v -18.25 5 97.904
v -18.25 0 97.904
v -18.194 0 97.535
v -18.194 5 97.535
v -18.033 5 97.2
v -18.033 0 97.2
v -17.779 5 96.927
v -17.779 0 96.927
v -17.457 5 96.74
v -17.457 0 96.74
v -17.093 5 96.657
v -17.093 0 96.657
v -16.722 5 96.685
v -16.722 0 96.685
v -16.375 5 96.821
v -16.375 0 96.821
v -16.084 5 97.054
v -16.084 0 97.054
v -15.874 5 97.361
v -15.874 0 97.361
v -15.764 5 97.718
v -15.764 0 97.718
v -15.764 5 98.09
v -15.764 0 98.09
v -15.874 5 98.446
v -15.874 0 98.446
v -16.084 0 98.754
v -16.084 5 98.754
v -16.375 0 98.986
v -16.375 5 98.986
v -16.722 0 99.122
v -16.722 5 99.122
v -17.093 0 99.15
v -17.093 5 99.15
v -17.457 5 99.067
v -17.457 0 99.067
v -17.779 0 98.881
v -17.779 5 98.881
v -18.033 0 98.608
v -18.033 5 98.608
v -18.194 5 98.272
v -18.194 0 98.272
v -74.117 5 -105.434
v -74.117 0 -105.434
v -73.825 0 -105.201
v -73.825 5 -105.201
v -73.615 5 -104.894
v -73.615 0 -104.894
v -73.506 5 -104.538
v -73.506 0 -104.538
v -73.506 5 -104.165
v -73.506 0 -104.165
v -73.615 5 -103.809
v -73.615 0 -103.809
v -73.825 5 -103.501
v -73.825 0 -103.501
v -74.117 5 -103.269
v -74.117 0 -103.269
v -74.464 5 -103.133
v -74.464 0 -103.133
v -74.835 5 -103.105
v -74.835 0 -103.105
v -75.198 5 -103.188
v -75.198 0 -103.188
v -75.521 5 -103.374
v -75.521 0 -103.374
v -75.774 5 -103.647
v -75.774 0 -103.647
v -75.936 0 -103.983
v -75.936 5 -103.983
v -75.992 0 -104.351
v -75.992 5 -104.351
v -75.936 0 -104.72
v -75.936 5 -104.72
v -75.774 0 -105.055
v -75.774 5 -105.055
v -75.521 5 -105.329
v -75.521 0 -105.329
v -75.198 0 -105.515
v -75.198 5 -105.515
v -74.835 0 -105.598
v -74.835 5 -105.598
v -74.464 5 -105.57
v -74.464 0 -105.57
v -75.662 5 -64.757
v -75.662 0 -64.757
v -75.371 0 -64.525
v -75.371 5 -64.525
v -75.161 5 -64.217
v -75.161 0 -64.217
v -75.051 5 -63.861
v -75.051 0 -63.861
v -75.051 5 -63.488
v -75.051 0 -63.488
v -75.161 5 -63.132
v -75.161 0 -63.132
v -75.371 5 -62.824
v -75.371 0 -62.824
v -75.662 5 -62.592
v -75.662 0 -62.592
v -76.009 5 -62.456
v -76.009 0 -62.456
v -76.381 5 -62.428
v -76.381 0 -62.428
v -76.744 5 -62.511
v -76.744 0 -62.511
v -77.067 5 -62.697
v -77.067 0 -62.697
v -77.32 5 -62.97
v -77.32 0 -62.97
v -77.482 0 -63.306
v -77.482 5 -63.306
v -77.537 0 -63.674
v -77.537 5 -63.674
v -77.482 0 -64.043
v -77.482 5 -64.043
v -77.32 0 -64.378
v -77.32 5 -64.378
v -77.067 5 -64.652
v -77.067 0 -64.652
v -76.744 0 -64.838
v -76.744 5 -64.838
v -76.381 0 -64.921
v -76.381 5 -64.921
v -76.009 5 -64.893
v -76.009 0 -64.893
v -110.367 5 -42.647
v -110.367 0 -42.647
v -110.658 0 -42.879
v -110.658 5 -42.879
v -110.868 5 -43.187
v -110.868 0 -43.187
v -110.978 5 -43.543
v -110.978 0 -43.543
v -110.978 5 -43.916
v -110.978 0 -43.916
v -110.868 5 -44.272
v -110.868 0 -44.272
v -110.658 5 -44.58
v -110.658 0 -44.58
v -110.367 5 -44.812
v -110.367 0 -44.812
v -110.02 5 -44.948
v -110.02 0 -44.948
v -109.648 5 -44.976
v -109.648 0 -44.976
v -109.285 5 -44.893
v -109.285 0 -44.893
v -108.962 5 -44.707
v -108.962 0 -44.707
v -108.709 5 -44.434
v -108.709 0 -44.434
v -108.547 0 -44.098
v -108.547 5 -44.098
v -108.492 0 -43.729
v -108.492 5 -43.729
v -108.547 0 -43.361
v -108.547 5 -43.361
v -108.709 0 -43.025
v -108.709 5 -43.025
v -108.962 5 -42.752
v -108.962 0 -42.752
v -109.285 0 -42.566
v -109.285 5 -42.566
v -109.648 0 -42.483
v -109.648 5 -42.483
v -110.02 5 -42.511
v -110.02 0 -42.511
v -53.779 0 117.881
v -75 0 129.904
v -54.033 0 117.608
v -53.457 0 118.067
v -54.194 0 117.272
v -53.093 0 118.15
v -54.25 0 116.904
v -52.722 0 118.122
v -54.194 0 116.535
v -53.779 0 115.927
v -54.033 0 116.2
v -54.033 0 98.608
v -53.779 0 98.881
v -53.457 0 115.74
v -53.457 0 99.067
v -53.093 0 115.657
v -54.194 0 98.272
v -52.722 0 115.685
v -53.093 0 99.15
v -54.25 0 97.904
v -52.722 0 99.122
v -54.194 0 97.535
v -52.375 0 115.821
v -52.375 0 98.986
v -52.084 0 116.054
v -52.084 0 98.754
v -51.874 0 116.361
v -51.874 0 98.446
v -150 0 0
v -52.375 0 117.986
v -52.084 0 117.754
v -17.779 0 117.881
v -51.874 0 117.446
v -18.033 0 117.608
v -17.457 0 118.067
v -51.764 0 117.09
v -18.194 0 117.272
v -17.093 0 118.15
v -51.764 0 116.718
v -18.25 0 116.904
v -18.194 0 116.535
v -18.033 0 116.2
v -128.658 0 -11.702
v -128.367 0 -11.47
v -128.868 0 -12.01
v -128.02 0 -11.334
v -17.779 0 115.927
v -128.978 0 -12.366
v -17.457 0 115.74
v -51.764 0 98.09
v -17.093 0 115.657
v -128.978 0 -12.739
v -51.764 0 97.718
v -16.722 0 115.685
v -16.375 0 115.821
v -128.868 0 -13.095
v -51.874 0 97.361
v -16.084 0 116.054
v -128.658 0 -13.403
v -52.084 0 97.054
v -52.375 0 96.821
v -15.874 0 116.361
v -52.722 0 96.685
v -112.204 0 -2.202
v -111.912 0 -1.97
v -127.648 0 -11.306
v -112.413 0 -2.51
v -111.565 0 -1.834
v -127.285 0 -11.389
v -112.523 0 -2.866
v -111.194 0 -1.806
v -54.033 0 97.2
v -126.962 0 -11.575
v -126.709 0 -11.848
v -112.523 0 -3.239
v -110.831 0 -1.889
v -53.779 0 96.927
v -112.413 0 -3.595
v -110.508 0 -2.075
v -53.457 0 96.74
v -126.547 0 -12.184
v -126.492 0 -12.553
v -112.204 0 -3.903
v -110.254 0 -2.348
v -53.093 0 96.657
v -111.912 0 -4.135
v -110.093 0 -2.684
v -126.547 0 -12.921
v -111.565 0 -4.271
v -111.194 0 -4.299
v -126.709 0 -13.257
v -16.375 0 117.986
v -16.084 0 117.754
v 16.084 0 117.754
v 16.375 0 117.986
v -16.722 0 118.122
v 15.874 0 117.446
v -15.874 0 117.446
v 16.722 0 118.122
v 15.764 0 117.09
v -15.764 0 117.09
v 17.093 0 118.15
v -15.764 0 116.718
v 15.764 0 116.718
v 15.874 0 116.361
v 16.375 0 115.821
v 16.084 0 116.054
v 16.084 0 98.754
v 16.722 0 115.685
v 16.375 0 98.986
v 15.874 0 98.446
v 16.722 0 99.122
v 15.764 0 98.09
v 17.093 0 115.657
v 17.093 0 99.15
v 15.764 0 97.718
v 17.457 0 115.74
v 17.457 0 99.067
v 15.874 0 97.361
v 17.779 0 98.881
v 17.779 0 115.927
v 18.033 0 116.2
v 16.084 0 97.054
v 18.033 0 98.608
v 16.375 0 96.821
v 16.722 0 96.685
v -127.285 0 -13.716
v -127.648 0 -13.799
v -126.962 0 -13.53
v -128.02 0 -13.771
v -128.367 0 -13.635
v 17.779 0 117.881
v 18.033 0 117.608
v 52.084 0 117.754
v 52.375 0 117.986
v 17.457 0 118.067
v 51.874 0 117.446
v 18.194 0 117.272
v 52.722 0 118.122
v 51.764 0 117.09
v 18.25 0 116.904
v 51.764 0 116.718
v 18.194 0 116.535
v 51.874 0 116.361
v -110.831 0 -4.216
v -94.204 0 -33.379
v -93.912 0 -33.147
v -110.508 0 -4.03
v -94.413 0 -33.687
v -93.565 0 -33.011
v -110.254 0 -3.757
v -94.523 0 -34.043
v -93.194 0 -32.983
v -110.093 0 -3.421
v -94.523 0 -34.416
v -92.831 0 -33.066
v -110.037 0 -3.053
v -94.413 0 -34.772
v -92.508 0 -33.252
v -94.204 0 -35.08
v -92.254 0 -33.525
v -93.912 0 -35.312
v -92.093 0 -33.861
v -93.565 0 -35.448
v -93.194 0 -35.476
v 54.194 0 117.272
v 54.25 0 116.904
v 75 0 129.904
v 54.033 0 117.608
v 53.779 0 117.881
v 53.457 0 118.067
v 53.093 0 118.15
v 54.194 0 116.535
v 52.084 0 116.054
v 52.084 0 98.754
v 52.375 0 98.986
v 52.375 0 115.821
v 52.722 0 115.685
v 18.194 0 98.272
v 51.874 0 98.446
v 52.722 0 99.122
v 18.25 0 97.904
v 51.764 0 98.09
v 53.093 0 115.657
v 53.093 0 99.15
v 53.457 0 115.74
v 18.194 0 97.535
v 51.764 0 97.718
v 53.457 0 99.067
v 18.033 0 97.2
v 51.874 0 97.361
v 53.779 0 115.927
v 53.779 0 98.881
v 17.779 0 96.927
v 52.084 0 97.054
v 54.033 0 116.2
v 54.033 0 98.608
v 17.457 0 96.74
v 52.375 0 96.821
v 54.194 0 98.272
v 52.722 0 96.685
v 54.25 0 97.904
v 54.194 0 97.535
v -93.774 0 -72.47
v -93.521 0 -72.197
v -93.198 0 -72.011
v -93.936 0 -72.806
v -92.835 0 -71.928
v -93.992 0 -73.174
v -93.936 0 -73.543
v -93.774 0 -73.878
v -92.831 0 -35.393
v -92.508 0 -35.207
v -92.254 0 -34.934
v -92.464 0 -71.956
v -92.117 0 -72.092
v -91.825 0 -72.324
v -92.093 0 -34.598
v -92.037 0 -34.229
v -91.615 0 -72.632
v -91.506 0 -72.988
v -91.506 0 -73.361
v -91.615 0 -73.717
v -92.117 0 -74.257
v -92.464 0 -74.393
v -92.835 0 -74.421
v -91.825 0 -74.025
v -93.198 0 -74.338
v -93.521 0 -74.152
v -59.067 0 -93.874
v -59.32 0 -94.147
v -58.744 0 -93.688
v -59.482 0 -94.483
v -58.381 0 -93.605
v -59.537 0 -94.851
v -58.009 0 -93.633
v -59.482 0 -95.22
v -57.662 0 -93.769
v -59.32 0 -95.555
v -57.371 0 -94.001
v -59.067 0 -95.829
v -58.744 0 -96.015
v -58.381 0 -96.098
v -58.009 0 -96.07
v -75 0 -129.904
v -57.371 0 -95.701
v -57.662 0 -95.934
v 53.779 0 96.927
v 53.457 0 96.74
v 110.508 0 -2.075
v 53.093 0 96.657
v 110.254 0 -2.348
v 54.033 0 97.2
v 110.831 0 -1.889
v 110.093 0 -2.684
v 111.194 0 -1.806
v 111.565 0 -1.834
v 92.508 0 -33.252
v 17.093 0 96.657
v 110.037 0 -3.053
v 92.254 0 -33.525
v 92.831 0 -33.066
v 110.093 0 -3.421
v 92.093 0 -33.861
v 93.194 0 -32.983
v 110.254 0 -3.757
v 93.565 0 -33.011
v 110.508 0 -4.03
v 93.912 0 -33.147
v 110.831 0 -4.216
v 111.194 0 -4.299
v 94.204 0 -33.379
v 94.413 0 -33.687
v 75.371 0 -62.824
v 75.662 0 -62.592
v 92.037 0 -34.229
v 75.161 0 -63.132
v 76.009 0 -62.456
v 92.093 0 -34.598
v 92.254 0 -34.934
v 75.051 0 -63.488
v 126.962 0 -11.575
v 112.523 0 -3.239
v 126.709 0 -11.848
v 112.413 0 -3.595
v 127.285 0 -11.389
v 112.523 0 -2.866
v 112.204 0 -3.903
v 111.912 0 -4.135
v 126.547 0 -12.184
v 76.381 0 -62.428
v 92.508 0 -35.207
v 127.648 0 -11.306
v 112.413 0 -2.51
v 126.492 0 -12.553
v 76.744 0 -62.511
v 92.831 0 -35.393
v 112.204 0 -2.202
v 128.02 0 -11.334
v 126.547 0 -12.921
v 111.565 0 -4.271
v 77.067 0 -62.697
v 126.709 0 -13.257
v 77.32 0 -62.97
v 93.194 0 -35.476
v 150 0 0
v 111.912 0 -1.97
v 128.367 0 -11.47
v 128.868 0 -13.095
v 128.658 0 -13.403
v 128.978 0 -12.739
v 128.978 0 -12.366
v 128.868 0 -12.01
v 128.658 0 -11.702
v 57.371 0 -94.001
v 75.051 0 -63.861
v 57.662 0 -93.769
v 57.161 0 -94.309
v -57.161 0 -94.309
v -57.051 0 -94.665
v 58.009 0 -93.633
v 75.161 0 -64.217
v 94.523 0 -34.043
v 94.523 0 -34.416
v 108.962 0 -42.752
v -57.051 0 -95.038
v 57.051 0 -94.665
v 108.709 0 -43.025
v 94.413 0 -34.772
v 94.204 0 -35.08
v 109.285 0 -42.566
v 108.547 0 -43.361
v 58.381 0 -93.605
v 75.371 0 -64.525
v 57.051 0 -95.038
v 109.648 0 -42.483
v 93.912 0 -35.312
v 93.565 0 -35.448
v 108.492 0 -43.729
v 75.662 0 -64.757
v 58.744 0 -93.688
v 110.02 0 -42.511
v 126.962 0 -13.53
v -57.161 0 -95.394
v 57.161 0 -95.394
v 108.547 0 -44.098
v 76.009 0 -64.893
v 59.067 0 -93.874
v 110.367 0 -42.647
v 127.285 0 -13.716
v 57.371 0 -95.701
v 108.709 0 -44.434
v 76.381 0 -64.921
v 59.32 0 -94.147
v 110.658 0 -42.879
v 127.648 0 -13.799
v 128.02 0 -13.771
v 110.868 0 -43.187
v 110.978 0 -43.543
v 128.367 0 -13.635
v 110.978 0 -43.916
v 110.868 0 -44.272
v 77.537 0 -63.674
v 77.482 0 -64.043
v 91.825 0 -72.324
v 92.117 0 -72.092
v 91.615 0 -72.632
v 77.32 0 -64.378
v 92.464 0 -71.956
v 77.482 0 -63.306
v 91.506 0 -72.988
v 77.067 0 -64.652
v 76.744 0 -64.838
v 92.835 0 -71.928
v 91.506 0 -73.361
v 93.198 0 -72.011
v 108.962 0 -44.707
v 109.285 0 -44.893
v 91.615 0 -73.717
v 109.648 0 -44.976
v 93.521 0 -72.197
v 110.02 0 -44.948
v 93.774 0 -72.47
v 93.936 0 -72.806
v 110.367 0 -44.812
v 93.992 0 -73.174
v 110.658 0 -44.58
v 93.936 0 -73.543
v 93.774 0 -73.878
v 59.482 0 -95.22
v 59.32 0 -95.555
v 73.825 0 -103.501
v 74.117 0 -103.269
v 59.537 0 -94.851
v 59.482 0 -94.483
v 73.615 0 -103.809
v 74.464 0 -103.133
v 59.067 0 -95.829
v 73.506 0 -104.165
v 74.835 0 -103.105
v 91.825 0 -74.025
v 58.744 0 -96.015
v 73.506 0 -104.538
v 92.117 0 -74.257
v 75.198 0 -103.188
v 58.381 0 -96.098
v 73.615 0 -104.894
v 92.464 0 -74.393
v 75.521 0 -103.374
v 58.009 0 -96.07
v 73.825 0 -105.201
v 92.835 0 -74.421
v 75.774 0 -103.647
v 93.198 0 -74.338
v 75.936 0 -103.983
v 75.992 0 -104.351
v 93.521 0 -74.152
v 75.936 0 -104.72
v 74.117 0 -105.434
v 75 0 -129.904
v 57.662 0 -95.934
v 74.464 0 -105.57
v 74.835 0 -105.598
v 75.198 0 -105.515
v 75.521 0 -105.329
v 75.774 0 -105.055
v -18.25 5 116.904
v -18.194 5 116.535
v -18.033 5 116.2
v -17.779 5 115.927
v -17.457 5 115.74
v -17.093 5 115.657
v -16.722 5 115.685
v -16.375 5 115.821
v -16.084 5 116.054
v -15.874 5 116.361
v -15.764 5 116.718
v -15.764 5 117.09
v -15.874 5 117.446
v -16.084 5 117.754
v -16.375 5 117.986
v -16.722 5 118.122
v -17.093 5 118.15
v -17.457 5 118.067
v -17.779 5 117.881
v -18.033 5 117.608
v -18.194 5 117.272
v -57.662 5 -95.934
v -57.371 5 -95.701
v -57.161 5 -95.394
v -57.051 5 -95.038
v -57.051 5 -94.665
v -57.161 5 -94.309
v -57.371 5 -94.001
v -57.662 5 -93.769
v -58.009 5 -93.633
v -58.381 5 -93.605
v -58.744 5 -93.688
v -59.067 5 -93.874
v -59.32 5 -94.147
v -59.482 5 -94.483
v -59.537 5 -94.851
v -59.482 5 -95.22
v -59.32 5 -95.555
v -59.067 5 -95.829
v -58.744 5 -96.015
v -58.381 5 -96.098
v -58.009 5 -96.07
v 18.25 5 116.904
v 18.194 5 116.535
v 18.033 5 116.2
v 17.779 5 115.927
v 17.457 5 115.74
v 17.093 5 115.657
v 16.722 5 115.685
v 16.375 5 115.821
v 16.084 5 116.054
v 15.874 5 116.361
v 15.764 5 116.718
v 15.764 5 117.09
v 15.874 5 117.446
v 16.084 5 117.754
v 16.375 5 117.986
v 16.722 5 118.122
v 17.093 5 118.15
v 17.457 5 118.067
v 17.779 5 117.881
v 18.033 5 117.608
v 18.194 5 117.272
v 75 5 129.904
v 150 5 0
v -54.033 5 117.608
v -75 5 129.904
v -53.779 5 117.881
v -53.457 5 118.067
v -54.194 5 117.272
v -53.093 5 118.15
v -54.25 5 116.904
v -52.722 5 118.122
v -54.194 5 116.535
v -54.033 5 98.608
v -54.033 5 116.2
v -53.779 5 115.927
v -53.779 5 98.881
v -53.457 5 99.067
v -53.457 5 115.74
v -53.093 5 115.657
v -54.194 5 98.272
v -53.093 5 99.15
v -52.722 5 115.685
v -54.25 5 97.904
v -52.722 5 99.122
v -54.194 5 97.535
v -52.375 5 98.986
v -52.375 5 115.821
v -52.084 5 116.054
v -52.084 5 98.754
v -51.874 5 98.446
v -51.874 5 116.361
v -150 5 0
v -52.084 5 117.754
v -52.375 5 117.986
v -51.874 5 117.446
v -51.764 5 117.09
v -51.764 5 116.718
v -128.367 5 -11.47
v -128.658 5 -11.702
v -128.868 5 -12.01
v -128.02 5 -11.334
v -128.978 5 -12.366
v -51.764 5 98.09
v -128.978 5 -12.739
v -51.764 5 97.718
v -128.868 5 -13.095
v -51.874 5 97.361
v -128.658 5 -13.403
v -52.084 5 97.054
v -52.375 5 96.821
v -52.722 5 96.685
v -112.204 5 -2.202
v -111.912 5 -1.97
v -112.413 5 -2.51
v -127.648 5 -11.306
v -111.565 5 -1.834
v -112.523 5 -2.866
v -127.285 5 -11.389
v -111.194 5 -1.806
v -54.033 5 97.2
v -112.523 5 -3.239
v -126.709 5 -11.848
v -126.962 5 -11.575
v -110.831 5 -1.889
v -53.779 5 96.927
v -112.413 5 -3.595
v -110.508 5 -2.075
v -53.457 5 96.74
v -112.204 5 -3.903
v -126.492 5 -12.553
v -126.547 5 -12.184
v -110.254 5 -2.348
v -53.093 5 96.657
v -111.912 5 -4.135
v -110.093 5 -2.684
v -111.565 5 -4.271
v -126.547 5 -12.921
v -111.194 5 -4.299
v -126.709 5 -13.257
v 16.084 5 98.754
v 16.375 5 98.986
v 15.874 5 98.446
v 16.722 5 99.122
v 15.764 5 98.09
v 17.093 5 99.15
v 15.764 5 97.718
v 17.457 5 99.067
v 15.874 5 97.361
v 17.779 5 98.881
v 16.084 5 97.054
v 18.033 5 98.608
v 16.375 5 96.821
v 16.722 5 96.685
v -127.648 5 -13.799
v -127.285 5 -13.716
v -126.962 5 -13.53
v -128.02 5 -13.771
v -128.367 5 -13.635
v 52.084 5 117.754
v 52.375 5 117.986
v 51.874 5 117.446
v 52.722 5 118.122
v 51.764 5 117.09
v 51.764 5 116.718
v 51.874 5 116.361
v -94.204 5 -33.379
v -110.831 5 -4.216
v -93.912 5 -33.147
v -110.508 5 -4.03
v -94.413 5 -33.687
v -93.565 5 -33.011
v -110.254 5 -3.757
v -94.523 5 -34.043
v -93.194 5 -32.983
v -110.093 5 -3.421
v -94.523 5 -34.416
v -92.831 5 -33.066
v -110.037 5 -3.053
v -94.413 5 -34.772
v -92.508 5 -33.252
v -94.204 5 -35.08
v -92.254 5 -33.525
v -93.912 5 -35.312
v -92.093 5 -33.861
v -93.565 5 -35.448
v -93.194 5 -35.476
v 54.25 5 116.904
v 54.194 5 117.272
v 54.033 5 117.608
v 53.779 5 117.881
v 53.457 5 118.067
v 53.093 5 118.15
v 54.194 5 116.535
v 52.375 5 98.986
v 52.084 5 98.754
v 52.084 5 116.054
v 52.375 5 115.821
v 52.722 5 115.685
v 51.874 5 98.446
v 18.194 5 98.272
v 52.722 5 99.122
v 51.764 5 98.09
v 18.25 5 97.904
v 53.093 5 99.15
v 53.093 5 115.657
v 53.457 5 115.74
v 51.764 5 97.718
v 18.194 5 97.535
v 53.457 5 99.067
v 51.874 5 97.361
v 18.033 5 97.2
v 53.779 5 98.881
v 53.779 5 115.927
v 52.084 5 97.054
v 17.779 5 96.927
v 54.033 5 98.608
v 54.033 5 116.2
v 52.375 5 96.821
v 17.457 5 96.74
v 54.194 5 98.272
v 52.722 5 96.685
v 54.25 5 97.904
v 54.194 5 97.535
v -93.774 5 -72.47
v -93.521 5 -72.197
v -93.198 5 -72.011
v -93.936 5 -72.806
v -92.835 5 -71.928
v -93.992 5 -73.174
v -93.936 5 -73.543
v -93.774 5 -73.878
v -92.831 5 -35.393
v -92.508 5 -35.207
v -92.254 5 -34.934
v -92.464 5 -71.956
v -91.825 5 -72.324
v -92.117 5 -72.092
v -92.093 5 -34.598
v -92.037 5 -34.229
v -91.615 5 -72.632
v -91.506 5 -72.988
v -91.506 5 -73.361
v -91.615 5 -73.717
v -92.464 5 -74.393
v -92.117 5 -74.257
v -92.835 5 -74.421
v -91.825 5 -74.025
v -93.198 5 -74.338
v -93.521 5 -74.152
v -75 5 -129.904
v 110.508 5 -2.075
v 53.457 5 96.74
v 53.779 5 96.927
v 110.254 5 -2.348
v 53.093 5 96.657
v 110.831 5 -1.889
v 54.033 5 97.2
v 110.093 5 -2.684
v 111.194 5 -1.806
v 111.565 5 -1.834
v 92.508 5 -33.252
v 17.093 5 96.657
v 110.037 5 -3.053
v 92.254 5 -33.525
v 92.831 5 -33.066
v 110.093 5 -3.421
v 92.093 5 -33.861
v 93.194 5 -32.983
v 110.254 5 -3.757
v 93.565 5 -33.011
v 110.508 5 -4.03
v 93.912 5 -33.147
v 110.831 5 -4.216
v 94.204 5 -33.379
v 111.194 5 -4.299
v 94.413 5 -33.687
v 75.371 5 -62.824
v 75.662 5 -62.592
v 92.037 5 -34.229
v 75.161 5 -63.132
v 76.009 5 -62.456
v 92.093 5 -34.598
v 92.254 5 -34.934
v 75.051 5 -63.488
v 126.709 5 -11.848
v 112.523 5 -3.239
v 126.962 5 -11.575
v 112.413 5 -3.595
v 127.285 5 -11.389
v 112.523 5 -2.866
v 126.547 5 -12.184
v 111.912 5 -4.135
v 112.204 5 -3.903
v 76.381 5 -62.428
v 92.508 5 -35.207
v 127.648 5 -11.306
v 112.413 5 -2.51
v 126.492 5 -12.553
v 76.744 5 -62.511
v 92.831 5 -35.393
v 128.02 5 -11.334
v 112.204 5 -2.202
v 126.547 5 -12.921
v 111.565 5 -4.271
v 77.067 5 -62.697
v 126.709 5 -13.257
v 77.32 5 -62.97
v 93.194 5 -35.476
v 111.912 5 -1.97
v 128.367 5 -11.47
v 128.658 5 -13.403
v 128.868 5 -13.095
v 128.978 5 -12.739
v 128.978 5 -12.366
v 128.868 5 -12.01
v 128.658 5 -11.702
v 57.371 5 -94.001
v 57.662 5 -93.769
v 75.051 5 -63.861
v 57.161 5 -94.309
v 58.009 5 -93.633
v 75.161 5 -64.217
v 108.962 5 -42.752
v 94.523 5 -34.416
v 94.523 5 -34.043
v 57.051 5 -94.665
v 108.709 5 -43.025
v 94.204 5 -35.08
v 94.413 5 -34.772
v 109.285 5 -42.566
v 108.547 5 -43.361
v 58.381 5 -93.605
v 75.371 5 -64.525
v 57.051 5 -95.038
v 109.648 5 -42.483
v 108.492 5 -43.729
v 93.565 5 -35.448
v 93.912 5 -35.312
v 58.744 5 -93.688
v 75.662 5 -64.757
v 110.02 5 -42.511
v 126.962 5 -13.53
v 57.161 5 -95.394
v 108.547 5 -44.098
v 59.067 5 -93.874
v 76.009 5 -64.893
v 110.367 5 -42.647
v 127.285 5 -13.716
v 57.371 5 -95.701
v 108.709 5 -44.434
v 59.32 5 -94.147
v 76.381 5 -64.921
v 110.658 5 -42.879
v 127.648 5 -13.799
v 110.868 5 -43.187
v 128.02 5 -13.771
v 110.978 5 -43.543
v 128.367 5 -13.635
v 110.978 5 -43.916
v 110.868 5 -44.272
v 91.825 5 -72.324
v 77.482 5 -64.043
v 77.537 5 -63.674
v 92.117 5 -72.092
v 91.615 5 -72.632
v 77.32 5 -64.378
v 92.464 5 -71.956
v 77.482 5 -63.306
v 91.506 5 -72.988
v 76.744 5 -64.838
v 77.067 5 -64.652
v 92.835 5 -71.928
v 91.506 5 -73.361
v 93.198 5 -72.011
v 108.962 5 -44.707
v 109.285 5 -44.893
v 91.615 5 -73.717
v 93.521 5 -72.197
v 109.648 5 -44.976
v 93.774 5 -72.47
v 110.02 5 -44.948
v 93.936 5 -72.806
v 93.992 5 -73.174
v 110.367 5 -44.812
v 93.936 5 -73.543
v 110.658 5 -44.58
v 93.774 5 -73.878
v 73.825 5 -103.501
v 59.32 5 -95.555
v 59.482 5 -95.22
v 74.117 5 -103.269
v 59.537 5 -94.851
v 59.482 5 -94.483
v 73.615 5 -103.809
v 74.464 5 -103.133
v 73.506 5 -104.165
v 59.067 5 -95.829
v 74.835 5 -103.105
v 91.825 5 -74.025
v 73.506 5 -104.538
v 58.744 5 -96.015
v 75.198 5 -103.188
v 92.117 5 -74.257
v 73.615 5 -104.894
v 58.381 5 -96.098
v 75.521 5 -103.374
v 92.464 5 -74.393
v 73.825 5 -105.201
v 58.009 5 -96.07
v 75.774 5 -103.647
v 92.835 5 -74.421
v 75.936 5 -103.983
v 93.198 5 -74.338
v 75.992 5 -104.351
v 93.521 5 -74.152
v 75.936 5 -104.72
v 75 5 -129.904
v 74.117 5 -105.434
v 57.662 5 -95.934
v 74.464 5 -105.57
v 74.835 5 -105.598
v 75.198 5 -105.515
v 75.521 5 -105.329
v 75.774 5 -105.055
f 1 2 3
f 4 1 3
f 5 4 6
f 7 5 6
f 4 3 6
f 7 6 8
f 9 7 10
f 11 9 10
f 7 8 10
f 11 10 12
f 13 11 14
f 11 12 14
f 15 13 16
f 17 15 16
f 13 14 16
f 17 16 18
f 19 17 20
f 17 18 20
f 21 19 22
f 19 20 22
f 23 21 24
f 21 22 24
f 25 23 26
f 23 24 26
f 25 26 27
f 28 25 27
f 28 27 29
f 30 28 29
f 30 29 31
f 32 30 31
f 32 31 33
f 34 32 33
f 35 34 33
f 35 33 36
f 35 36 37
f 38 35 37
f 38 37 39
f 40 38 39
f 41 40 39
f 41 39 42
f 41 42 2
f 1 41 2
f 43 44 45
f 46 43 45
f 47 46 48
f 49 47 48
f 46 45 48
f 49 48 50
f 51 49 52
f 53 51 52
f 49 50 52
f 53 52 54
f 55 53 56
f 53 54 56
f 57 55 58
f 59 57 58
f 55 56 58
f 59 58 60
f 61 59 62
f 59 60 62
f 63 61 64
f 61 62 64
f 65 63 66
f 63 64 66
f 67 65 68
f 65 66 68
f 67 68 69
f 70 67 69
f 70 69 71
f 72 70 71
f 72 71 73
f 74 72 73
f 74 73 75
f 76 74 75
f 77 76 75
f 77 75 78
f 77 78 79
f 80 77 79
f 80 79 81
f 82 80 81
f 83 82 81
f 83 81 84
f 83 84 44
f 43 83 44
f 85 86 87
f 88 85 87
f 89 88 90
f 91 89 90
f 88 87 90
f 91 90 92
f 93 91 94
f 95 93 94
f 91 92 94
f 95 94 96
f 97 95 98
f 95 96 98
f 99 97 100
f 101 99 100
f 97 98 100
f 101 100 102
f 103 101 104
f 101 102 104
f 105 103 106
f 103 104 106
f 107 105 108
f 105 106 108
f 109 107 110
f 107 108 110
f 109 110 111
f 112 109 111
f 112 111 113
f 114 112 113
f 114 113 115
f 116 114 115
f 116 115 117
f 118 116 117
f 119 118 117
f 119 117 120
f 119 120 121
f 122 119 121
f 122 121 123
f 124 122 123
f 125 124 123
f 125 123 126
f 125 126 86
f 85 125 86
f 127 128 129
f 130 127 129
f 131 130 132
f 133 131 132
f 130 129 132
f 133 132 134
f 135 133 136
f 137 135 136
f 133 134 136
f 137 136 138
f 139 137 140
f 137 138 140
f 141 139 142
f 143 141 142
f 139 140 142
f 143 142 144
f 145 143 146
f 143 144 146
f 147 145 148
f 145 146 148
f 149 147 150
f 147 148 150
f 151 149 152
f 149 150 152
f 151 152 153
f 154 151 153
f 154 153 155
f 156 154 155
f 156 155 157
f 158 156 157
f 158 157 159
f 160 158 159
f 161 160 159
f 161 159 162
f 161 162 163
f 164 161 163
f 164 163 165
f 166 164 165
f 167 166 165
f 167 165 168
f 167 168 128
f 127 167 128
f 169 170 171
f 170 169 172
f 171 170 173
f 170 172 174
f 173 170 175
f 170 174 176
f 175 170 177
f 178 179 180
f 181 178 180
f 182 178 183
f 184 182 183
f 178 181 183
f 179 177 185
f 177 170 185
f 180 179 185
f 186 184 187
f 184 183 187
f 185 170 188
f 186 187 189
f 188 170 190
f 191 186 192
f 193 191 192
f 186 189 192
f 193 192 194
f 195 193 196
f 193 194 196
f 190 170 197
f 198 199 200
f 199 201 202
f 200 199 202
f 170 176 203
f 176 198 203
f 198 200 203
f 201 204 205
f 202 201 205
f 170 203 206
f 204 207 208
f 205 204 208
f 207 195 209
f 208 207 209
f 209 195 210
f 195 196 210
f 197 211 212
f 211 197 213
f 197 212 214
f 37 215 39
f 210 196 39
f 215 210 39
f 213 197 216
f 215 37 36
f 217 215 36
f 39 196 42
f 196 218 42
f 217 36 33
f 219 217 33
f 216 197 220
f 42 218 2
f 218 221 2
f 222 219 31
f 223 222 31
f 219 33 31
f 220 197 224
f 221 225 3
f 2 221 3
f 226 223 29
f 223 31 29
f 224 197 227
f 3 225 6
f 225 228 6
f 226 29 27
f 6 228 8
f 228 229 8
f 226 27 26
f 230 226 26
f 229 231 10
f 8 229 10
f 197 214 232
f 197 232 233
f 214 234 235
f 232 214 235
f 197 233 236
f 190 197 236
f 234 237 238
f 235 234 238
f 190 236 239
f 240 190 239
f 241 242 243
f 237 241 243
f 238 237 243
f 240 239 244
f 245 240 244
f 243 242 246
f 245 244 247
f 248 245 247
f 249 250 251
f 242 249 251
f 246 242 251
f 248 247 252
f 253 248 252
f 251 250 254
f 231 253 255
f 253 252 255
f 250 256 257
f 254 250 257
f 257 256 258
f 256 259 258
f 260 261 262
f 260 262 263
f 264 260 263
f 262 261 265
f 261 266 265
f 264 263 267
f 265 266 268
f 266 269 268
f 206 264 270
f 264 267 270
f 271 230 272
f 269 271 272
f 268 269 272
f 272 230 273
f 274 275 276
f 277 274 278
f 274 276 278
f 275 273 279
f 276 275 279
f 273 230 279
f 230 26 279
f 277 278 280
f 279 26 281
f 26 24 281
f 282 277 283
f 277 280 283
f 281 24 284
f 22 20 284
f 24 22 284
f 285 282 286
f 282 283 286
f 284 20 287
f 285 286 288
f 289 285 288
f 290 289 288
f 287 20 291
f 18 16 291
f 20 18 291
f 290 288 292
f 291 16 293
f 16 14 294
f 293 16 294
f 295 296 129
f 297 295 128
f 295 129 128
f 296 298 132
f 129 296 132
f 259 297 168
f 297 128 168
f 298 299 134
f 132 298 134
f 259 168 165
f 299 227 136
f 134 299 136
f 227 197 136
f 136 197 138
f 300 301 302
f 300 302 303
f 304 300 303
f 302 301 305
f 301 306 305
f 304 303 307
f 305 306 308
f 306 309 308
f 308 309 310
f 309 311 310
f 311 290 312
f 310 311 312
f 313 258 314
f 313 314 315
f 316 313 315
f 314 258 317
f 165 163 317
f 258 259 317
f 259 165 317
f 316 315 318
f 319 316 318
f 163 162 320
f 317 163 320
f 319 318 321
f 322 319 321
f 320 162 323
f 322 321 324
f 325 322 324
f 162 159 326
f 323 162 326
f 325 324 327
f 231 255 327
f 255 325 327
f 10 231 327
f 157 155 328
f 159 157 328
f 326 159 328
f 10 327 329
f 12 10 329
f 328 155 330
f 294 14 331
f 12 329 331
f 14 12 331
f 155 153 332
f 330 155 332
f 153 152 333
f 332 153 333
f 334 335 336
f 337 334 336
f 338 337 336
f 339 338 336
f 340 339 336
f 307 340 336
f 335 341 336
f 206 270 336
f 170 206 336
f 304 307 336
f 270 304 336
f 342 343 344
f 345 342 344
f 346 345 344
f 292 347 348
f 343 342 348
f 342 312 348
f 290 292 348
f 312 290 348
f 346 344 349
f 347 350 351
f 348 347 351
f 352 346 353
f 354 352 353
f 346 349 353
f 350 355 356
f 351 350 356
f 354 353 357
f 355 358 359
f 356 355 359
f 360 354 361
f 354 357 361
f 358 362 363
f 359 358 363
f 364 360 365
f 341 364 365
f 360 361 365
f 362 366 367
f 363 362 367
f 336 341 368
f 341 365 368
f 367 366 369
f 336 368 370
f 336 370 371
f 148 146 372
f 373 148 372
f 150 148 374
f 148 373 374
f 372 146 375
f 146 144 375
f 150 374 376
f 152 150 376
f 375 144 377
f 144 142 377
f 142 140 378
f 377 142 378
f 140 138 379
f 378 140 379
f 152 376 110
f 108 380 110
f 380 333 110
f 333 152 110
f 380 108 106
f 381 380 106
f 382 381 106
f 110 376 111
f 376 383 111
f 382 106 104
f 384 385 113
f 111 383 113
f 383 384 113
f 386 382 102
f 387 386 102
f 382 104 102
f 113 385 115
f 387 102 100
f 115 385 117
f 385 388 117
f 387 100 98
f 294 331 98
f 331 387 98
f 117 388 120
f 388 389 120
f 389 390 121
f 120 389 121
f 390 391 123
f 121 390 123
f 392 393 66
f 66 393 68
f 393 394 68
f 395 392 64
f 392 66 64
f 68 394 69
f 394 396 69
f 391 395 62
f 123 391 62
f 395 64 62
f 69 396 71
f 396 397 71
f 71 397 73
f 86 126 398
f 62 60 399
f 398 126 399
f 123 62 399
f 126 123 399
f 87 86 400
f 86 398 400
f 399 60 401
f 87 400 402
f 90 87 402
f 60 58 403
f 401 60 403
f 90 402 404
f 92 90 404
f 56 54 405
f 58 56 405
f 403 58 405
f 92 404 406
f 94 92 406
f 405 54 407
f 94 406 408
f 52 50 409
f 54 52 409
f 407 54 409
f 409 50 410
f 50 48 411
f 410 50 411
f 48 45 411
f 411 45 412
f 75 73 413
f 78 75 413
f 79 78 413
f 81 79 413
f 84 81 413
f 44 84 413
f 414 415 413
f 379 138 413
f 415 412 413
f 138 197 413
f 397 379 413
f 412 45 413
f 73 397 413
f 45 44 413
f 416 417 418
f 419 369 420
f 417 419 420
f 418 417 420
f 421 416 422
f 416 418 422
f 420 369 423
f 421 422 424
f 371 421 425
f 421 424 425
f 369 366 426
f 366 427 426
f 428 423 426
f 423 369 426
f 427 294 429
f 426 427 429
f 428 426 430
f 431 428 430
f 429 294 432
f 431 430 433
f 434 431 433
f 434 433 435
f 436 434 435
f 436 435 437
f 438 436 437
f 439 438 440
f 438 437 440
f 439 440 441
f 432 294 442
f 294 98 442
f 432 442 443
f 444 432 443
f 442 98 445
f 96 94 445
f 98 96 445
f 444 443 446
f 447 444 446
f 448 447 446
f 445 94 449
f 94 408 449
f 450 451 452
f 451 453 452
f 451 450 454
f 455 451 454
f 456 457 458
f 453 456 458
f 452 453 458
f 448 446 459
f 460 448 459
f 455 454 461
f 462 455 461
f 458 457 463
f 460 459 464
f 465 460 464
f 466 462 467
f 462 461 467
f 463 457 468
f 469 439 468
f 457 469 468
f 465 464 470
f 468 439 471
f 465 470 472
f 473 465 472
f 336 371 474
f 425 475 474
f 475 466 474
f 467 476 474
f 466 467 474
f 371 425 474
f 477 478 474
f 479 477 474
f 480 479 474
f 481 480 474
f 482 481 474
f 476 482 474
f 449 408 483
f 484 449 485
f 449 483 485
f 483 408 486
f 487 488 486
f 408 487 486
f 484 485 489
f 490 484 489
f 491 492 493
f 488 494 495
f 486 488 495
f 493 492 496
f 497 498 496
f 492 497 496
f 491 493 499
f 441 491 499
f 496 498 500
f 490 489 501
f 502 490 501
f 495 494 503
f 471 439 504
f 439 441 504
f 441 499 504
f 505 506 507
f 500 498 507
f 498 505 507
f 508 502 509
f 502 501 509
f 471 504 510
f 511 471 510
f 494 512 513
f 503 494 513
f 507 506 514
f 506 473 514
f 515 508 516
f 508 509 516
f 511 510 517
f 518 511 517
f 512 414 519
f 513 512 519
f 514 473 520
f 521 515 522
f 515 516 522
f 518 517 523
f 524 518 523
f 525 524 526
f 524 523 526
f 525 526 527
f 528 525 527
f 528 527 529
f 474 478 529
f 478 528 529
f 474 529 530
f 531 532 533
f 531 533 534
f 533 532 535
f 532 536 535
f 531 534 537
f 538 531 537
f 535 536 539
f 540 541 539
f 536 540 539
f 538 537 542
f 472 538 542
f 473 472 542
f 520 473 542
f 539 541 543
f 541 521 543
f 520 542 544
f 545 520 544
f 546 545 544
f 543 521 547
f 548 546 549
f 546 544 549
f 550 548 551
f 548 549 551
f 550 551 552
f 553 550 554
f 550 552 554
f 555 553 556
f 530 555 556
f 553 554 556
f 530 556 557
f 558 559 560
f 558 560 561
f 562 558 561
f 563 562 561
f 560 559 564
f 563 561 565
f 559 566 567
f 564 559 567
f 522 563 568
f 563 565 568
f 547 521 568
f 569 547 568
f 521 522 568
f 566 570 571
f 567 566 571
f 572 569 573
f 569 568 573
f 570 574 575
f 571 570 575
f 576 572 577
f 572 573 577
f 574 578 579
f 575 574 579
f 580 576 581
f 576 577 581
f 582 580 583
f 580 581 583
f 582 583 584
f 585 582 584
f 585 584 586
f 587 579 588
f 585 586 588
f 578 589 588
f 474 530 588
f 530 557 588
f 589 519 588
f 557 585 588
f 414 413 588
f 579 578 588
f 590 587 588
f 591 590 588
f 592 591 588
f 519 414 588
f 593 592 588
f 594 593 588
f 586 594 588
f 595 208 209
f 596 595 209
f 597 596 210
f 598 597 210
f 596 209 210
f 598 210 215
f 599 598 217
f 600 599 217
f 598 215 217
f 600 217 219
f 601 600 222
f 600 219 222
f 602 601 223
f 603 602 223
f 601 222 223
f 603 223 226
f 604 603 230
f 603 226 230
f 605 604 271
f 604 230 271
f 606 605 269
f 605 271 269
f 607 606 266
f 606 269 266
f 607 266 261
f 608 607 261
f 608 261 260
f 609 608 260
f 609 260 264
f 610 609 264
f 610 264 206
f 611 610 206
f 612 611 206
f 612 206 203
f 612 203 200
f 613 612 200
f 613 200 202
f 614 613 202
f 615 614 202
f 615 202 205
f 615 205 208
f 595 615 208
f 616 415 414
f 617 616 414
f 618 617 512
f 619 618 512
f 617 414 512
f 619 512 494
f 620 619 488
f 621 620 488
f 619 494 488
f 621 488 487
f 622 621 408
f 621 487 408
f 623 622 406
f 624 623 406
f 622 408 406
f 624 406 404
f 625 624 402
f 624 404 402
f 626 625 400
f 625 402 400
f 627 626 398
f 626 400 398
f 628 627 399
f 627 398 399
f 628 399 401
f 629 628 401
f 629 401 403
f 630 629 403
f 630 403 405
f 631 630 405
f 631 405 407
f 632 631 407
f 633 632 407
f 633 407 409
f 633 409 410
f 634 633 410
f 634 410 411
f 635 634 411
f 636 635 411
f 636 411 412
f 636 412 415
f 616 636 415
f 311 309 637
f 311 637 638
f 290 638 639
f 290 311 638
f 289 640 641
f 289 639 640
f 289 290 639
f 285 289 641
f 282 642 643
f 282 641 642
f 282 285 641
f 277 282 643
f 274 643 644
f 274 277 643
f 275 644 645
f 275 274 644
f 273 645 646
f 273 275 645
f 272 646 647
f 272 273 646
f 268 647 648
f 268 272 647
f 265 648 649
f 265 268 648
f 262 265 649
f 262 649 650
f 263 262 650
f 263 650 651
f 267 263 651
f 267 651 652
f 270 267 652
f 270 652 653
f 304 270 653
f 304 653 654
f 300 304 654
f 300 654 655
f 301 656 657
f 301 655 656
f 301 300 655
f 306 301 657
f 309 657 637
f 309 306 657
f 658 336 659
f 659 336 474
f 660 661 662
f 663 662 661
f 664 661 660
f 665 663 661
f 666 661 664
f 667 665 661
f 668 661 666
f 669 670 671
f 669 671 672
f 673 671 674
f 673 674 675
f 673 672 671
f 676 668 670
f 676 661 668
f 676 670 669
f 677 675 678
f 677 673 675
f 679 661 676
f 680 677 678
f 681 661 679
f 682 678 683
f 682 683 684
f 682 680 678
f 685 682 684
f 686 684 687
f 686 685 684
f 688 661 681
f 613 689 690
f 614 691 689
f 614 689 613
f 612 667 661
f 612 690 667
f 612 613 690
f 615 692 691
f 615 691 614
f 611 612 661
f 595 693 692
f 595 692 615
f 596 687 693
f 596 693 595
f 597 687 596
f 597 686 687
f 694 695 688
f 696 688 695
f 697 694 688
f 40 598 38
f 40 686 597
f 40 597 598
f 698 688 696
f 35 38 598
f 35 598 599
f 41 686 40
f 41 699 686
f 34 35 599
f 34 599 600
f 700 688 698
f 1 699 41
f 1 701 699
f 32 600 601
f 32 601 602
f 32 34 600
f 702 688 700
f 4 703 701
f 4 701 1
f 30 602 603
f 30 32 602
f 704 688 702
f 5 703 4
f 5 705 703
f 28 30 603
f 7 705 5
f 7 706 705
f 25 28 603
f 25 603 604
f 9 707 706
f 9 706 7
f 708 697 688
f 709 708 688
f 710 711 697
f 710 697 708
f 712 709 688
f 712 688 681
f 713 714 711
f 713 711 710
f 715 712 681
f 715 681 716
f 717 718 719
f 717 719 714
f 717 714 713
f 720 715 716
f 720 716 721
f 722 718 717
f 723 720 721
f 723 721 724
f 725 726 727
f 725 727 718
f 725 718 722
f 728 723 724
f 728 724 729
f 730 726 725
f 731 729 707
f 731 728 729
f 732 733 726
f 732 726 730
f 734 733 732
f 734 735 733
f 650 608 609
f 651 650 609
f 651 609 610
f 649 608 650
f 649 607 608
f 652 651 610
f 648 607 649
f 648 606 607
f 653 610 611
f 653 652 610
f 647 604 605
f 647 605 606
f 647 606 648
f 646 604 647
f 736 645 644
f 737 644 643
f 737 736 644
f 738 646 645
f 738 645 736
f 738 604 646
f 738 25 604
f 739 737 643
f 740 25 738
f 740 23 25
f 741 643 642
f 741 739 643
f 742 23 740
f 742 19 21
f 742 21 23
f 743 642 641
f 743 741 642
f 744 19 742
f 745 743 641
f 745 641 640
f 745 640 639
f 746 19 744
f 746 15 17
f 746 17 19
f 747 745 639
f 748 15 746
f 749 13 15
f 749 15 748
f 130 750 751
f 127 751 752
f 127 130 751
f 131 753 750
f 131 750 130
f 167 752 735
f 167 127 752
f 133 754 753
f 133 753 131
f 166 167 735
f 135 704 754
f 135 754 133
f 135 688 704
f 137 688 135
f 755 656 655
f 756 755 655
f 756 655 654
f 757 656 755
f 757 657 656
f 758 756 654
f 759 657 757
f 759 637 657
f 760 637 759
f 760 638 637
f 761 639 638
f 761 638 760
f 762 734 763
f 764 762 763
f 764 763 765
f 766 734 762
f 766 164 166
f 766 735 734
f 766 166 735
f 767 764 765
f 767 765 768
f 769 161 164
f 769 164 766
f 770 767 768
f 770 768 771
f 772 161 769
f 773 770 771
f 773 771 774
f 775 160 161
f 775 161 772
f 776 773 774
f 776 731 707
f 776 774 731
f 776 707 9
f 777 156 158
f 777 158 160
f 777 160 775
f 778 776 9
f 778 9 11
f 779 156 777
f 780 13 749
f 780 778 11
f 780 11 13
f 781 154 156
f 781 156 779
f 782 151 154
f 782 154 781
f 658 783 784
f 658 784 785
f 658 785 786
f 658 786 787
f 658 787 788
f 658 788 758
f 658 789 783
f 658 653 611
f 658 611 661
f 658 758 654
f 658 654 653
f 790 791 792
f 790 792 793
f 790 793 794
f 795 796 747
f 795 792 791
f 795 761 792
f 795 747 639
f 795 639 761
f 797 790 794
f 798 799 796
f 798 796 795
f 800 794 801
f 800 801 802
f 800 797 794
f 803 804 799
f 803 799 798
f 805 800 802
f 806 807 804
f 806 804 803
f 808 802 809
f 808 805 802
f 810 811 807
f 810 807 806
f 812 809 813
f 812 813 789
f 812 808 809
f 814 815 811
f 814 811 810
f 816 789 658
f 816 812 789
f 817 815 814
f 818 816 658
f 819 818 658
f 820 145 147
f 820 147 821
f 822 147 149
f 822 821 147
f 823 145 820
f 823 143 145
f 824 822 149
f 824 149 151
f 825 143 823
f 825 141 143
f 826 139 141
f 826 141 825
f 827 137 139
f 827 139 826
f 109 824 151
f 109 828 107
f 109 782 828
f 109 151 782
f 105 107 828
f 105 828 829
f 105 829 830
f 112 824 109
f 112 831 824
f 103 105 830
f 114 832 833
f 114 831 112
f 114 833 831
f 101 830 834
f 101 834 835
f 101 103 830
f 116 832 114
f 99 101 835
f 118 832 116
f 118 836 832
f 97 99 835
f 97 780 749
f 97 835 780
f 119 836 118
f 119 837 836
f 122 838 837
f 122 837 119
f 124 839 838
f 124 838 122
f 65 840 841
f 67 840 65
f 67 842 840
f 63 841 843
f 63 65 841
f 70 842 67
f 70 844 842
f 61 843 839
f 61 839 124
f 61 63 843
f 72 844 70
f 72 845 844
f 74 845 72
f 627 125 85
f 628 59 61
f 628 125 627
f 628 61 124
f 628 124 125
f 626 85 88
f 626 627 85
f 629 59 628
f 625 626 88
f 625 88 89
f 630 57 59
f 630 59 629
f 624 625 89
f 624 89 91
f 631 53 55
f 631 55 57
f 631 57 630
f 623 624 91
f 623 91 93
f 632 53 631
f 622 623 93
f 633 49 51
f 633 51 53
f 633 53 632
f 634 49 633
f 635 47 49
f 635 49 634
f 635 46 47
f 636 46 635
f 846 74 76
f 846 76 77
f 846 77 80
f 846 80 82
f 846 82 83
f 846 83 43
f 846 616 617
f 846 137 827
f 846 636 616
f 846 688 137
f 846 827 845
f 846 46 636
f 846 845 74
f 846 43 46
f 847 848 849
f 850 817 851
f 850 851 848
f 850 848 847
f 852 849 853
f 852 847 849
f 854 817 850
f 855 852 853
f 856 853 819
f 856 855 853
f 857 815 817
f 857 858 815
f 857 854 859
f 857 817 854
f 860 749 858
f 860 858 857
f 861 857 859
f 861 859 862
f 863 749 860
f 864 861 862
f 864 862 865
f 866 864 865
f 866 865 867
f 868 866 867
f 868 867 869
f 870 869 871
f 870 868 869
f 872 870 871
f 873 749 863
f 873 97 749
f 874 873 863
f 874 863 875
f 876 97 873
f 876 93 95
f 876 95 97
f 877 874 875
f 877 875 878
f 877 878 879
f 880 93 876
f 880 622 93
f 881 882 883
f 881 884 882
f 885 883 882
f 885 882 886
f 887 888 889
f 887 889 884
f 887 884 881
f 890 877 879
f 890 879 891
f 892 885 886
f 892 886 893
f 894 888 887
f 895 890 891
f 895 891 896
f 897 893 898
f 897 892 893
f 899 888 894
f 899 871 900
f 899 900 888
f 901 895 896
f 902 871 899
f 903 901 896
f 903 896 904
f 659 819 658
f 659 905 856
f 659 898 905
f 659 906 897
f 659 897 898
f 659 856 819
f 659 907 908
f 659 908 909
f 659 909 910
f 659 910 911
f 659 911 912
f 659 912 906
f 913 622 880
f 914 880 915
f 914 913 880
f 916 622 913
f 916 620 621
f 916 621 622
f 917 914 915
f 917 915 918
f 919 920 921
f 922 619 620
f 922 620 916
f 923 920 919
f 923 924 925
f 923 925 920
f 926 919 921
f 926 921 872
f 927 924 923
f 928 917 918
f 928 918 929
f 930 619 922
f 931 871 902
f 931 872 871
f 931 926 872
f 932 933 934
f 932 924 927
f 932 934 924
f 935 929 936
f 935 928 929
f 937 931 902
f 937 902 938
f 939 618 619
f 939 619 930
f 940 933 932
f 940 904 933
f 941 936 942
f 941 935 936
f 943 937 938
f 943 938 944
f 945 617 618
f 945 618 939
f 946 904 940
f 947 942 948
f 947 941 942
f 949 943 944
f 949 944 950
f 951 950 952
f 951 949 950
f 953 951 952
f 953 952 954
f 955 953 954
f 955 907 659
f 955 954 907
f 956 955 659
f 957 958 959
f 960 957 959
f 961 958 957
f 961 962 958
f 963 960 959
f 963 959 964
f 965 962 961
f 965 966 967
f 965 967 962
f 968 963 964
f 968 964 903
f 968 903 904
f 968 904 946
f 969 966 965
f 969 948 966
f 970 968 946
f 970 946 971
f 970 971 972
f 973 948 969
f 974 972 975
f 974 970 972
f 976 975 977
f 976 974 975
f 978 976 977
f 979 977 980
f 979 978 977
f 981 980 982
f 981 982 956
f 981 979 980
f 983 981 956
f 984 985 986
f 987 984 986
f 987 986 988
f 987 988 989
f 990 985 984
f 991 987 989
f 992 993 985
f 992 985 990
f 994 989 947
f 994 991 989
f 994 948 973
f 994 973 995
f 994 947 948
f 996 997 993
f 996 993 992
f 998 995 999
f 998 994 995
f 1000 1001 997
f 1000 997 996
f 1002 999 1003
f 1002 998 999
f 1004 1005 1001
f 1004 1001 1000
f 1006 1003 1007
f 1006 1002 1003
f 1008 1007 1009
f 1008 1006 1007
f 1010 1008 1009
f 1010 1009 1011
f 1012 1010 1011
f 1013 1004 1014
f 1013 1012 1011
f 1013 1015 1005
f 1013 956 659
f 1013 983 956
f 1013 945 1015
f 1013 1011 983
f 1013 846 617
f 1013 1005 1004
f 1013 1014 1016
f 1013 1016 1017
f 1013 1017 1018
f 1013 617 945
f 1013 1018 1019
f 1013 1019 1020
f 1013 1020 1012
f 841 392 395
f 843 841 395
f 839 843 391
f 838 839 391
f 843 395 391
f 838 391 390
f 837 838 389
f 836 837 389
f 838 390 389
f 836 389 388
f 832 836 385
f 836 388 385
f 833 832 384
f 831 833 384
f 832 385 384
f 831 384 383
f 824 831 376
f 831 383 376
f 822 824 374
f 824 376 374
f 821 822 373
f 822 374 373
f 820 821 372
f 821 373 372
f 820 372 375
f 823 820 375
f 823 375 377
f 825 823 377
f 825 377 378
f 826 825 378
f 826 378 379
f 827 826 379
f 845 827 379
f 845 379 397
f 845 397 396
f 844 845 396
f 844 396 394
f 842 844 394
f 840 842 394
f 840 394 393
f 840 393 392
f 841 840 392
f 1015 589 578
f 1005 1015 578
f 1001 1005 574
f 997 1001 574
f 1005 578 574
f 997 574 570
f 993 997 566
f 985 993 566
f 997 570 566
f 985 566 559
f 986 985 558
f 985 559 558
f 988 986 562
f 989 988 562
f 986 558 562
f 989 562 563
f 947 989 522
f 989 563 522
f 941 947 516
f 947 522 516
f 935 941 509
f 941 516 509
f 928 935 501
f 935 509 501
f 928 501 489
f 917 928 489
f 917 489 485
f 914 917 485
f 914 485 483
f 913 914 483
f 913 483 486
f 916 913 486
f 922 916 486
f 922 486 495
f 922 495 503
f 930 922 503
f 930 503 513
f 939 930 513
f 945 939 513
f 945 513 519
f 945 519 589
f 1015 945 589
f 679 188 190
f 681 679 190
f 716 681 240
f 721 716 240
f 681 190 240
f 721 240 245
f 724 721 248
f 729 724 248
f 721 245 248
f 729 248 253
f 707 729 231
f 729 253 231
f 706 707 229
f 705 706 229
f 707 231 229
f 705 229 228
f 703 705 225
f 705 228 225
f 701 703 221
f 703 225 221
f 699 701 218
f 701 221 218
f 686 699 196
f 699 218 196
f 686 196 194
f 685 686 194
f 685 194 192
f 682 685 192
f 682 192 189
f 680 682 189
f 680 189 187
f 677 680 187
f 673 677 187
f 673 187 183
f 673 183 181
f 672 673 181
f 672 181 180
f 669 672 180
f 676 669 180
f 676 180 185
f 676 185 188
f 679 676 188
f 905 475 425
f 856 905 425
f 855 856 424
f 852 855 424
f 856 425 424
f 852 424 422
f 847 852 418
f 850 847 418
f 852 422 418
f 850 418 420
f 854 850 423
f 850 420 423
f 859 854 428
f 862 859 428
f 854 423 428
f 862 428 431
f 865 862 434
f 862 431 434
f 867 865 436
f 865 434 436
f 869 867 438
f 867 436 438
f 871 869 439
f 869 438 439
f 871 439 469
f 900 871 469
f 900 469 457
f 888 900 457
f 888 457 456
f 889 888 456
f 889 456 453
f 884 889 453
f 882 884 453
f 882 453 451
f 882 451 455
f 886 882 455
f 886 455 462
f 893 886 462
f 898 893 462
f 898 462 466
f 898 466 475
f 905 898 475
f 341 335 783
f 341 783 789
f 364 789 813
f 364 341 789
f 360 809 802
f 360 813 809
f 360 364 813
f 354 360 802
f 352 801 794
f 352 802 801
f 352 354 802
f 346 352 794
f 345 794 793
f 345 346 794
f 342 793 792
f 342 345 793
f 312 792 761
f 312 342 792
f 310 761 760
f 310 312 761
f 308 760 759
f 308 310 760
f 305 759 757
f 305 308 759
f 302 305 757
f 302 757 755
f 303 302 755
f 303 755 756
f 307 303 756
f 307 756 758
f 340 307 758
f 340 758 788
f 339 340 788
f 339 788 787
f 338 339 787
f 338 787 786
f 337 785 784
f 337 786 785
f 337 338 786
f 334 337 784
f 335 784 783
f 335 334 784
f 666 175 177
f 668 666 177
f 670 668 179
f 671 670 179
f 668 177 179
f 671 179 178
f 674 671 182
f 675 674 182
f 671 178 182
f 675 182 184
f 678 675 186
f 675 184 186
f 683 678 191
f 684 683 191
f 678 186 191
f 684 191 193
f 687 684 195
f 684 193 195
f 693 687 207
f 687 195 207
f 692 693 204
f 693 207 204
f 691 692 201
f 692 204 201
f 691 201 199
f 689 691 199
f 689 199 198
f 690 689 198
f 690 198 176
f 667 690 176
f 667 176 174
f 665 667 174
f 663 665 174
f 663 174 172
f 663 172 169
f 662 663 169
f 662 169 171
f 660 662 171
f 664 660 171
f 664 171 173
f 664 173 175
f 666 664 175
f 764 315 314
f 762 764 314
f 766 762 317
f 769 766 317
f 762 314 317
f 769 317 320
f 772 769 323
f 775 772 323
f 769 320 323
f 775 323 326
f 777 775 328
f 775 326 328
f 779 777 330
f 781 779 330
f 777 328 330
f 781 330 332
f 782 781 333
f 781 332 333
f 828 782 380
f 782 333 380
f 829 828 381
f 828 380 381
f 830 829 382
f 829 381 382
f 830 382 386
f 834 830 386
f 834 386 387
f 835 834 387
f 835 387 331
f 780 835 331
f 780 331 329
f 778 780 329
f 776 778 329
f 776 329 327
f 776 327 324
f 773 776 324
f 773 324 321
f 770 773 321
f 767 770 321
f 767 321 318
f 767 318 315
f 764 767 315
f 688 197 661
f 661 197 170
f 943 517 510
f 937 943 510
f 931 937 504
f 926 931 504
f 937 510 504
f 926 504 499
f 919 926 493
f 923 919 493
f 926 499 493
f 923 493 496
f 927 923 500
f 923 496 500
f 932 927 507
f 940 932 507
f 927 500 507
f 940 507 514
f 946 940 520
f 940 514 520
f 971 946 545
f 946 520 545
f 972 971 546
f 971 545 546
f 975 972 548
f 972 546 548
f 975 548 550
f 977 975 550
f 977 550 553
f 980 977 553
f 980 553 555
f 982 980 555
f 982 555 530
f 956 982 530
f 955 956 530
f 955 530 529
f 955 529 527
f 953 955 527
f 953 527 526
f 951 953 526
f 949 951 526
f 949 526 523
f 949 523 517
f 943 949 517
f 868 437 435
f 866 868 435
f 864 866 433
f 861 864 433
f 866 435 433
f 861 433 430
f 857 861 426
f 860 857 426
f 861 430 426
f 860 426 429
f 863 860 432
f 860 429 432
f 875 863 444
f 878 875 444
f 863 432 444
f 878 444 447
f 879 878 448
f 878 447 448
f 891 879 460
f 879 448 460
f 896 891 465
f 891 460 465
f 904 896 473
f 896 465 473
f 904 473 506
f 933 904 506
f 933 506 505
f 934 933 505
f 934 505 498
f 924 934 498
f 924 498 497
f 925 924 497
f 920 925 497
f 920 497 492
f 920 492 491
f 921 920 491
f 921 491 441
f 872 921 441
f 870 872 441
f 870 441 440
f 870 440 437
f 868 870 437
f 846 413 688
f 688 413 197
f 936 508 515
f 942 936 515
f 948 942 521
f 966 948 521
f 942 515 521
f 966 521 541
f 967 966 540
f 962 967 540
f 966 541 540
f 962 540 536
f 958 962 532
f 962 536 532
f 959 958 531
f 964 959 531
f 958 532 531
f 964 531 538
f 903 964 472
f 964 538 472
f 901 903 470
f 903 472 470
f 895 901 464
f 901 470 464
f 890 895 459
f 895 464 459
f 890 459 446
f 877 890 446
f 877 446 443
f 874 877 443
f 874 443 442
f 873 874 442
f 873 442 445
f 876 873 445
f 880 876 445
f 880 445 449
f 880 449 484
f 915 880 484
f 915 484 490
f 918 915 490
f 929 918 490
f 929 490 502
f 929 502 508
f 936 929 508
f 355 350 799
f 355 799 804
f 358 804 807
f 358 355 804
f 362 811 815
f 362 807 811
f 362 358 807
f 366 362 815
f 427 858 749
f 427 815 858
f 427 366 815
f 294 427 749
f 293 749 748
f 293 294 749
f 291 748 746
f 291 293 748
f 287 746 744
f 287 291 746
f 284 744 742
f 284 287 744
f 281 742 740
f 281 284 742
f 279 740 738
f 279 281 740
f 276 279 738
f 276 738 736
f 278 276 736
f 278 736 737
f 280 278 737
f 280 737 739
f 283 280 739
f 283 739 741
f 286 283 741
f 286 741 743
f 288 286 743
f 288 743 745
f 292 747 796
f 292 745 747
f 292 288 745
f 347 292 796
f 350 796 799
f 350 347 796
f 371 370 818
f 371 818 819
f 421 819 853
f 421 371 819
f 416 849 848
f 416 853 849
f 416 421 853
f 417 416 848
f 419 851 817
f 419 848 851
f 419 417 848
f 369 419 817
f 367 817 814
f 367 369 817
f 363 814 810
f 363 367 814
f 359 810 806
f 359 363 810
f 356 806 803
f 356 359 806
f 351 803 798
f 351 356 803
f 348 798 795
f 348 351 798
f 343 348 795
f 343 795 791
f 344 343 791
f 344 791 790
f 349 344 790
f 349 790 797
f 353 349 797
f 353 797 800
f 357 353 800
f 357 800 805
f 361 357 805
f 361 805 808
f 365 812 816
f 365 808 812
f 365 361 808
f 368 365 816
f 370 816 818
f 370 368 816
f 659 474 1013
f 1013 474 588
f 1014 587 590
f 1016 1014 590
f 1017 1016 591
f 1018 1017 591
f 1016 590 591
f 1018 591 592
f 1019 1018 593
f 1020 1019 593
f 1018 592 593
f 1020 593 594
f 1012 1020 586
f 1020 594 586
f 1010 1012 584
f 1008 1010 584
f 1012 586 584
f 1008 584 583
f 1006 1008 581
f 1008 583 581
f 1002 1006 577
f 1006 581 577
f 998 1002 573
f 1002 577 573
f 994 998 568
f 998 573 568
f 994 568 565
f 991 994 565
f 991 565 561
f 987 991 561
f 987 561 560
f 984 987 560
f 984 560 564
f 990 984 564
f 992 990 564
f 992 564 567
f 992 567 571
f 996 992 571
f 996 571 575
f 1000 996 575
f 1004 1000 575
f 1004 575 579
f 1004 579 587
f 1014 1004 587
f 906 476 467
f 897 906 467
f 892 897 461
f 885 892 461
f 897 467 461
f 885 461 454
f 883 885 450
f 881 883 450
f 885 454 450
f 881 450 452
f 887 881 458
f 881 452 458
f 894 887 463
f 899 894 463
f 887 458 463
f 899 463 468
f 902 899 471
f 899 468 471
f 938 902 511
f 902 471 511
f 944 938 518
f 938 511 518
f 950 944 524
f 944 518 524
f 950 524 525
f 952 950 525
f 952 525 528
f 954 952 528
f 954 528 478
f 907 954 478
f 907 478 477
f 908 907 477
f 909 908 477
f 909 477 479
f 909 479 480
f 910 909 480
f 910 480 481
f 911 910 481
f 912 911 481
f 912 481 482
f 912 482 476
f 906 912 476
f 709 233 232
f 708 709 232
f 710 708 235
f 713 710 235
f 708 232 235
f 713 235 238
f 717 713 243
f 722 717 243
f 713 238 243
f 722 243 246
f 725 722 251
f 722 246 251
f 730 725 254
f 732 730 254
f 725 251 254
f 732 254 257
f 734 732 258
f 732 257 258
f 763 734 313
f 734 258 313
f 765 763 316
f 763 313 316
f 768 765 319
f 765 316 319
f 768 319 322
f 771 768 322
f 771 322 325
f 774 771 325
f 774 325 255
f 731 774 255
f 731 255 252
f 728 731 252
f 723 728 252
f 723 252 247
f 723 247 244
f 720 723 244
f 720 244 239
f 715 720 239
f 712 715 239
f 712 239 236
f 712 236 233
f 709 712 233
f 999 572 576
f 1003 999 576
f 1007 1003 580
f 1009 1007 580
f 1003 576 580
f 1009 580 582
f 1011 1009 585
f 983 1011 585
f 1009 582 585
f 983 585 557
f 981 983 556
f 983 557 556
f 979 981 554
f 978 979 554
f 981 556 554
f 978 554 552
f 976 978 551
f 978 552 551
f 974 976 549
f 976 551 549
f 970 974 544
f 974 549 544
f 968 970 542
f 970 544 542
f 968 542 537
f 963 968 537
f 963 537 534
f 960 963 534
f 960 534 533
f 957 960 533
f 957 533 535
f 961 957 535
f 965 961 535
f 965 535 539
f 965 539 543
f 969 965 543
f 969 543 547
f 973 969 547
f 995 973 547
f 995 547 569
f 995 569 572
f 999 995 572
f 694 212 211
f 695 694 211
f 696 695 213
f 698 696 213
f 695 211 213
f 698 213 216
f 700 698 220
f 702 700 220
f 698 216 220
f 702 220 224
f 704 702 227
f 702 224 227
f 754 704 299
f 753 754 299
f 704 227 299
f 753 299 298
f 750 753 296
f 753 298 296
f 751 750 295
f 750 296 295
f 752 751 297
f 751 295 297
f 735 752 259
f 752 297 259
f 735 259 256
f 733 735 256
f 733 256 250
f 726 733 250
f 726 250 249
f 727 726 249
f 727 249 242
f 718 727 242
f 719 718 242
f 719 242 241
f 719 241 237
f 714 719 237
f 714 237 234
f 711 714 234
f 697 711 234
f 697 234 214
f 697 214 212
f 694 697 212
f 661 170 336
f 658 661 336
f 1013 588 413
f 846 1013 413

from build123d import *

# Parameters (mm, degrees)
BOSS_EXTRUDE1_DEPTH   = 5
M3X0_5_TAPPED_HOLE3_D = 2.5
CIRPATTERN3_COUNT     = 3
CIRPATTERN3_COPY_1_D  = 2.5
CIRPATTERN3_COPY_2_D  = 2.5


with BuildPart() as part:
    # Sketch1 → Boss-Extrude1 (new body)
    with BuildSketch(Plane(origin=(0, 0, 0), x_dir=(1, 0, 0), z_dir=(0, 1, 0))):
        Polygon((150, 0), (75, 129.903810568), (-75, 129.903810568), (-150, 0), (-75, -129.903810568), (75, -129.903810568), align=None)
    extrude(amount=BOSS_EXTRUDE1_DEPTH)

    # M3x0.5 Tapped Hole3 (through all)
    with Locations(Plane(origin=(0, 5, 0), x_dir=(1, 0, 0), z_dir=(0, 1, 0))):
        with Locations((-53, -97.903810568), (-17, -97.903810568), (-17, -116.903810568), (-53, -116.903810568)):
            m3x0_5_tapped_hole3 = Hole(M3X0_5_TAPPED_HOLE3_D / 2)

    # Mirror5: M3x0.5 Tapped Hole3 across Right Plane
    add(m3x0_5_tapped_hole3.mirror(Plane(origin=(0, 0, 0), x_dir=(0, 0, -1), z_dir=(1, 0, 0))), mode=Mode.SUBTRACT)

    # CirPattern3: M3x0.5 Tapped Hole3 ×3 about axis
    cirpattern3_axis = Axis((0, 0, 0), (0, 1, 0))
    for i in range(1, CIRPATTERN3_COUNT):
        add(m3x0_5_tapped_hole3.rotate(cirpattern3_axis, i * 360 / CIRPATTERN3_COUNT), mode=Mode.SUBTRACT)

    # CirPattern3 copy 1 (through all)
    with Locations(Plane(origin=(0, 5, 0), x_dir=(0.4999999999999998, 0, 0.8660254037844387), z_dir=(0, 1, 0))):
        with Locations((-53, 97.903810568), (-17, 97.903810568), (-17, 116.903810568), (-53, 116.903810568)):
            Hole(CIRPATTERN3_COPY_1_D / 2)

    # CirPattern3 copy 2 (through all)
    with Locations(Plane(origin=(0, 5, 0), x_dir=(0.5000000000000004, 0, -0.8660254037844384), z_dir=(0, 1, 0))):
        with Locations((-53, 97.903810568), (-17, 97.903810568), (-17, 116.903810568), (-53, 116.903810568)):
            Hole(CIRPATTERN3_COPY_2_D / 2)


solid = part.part
